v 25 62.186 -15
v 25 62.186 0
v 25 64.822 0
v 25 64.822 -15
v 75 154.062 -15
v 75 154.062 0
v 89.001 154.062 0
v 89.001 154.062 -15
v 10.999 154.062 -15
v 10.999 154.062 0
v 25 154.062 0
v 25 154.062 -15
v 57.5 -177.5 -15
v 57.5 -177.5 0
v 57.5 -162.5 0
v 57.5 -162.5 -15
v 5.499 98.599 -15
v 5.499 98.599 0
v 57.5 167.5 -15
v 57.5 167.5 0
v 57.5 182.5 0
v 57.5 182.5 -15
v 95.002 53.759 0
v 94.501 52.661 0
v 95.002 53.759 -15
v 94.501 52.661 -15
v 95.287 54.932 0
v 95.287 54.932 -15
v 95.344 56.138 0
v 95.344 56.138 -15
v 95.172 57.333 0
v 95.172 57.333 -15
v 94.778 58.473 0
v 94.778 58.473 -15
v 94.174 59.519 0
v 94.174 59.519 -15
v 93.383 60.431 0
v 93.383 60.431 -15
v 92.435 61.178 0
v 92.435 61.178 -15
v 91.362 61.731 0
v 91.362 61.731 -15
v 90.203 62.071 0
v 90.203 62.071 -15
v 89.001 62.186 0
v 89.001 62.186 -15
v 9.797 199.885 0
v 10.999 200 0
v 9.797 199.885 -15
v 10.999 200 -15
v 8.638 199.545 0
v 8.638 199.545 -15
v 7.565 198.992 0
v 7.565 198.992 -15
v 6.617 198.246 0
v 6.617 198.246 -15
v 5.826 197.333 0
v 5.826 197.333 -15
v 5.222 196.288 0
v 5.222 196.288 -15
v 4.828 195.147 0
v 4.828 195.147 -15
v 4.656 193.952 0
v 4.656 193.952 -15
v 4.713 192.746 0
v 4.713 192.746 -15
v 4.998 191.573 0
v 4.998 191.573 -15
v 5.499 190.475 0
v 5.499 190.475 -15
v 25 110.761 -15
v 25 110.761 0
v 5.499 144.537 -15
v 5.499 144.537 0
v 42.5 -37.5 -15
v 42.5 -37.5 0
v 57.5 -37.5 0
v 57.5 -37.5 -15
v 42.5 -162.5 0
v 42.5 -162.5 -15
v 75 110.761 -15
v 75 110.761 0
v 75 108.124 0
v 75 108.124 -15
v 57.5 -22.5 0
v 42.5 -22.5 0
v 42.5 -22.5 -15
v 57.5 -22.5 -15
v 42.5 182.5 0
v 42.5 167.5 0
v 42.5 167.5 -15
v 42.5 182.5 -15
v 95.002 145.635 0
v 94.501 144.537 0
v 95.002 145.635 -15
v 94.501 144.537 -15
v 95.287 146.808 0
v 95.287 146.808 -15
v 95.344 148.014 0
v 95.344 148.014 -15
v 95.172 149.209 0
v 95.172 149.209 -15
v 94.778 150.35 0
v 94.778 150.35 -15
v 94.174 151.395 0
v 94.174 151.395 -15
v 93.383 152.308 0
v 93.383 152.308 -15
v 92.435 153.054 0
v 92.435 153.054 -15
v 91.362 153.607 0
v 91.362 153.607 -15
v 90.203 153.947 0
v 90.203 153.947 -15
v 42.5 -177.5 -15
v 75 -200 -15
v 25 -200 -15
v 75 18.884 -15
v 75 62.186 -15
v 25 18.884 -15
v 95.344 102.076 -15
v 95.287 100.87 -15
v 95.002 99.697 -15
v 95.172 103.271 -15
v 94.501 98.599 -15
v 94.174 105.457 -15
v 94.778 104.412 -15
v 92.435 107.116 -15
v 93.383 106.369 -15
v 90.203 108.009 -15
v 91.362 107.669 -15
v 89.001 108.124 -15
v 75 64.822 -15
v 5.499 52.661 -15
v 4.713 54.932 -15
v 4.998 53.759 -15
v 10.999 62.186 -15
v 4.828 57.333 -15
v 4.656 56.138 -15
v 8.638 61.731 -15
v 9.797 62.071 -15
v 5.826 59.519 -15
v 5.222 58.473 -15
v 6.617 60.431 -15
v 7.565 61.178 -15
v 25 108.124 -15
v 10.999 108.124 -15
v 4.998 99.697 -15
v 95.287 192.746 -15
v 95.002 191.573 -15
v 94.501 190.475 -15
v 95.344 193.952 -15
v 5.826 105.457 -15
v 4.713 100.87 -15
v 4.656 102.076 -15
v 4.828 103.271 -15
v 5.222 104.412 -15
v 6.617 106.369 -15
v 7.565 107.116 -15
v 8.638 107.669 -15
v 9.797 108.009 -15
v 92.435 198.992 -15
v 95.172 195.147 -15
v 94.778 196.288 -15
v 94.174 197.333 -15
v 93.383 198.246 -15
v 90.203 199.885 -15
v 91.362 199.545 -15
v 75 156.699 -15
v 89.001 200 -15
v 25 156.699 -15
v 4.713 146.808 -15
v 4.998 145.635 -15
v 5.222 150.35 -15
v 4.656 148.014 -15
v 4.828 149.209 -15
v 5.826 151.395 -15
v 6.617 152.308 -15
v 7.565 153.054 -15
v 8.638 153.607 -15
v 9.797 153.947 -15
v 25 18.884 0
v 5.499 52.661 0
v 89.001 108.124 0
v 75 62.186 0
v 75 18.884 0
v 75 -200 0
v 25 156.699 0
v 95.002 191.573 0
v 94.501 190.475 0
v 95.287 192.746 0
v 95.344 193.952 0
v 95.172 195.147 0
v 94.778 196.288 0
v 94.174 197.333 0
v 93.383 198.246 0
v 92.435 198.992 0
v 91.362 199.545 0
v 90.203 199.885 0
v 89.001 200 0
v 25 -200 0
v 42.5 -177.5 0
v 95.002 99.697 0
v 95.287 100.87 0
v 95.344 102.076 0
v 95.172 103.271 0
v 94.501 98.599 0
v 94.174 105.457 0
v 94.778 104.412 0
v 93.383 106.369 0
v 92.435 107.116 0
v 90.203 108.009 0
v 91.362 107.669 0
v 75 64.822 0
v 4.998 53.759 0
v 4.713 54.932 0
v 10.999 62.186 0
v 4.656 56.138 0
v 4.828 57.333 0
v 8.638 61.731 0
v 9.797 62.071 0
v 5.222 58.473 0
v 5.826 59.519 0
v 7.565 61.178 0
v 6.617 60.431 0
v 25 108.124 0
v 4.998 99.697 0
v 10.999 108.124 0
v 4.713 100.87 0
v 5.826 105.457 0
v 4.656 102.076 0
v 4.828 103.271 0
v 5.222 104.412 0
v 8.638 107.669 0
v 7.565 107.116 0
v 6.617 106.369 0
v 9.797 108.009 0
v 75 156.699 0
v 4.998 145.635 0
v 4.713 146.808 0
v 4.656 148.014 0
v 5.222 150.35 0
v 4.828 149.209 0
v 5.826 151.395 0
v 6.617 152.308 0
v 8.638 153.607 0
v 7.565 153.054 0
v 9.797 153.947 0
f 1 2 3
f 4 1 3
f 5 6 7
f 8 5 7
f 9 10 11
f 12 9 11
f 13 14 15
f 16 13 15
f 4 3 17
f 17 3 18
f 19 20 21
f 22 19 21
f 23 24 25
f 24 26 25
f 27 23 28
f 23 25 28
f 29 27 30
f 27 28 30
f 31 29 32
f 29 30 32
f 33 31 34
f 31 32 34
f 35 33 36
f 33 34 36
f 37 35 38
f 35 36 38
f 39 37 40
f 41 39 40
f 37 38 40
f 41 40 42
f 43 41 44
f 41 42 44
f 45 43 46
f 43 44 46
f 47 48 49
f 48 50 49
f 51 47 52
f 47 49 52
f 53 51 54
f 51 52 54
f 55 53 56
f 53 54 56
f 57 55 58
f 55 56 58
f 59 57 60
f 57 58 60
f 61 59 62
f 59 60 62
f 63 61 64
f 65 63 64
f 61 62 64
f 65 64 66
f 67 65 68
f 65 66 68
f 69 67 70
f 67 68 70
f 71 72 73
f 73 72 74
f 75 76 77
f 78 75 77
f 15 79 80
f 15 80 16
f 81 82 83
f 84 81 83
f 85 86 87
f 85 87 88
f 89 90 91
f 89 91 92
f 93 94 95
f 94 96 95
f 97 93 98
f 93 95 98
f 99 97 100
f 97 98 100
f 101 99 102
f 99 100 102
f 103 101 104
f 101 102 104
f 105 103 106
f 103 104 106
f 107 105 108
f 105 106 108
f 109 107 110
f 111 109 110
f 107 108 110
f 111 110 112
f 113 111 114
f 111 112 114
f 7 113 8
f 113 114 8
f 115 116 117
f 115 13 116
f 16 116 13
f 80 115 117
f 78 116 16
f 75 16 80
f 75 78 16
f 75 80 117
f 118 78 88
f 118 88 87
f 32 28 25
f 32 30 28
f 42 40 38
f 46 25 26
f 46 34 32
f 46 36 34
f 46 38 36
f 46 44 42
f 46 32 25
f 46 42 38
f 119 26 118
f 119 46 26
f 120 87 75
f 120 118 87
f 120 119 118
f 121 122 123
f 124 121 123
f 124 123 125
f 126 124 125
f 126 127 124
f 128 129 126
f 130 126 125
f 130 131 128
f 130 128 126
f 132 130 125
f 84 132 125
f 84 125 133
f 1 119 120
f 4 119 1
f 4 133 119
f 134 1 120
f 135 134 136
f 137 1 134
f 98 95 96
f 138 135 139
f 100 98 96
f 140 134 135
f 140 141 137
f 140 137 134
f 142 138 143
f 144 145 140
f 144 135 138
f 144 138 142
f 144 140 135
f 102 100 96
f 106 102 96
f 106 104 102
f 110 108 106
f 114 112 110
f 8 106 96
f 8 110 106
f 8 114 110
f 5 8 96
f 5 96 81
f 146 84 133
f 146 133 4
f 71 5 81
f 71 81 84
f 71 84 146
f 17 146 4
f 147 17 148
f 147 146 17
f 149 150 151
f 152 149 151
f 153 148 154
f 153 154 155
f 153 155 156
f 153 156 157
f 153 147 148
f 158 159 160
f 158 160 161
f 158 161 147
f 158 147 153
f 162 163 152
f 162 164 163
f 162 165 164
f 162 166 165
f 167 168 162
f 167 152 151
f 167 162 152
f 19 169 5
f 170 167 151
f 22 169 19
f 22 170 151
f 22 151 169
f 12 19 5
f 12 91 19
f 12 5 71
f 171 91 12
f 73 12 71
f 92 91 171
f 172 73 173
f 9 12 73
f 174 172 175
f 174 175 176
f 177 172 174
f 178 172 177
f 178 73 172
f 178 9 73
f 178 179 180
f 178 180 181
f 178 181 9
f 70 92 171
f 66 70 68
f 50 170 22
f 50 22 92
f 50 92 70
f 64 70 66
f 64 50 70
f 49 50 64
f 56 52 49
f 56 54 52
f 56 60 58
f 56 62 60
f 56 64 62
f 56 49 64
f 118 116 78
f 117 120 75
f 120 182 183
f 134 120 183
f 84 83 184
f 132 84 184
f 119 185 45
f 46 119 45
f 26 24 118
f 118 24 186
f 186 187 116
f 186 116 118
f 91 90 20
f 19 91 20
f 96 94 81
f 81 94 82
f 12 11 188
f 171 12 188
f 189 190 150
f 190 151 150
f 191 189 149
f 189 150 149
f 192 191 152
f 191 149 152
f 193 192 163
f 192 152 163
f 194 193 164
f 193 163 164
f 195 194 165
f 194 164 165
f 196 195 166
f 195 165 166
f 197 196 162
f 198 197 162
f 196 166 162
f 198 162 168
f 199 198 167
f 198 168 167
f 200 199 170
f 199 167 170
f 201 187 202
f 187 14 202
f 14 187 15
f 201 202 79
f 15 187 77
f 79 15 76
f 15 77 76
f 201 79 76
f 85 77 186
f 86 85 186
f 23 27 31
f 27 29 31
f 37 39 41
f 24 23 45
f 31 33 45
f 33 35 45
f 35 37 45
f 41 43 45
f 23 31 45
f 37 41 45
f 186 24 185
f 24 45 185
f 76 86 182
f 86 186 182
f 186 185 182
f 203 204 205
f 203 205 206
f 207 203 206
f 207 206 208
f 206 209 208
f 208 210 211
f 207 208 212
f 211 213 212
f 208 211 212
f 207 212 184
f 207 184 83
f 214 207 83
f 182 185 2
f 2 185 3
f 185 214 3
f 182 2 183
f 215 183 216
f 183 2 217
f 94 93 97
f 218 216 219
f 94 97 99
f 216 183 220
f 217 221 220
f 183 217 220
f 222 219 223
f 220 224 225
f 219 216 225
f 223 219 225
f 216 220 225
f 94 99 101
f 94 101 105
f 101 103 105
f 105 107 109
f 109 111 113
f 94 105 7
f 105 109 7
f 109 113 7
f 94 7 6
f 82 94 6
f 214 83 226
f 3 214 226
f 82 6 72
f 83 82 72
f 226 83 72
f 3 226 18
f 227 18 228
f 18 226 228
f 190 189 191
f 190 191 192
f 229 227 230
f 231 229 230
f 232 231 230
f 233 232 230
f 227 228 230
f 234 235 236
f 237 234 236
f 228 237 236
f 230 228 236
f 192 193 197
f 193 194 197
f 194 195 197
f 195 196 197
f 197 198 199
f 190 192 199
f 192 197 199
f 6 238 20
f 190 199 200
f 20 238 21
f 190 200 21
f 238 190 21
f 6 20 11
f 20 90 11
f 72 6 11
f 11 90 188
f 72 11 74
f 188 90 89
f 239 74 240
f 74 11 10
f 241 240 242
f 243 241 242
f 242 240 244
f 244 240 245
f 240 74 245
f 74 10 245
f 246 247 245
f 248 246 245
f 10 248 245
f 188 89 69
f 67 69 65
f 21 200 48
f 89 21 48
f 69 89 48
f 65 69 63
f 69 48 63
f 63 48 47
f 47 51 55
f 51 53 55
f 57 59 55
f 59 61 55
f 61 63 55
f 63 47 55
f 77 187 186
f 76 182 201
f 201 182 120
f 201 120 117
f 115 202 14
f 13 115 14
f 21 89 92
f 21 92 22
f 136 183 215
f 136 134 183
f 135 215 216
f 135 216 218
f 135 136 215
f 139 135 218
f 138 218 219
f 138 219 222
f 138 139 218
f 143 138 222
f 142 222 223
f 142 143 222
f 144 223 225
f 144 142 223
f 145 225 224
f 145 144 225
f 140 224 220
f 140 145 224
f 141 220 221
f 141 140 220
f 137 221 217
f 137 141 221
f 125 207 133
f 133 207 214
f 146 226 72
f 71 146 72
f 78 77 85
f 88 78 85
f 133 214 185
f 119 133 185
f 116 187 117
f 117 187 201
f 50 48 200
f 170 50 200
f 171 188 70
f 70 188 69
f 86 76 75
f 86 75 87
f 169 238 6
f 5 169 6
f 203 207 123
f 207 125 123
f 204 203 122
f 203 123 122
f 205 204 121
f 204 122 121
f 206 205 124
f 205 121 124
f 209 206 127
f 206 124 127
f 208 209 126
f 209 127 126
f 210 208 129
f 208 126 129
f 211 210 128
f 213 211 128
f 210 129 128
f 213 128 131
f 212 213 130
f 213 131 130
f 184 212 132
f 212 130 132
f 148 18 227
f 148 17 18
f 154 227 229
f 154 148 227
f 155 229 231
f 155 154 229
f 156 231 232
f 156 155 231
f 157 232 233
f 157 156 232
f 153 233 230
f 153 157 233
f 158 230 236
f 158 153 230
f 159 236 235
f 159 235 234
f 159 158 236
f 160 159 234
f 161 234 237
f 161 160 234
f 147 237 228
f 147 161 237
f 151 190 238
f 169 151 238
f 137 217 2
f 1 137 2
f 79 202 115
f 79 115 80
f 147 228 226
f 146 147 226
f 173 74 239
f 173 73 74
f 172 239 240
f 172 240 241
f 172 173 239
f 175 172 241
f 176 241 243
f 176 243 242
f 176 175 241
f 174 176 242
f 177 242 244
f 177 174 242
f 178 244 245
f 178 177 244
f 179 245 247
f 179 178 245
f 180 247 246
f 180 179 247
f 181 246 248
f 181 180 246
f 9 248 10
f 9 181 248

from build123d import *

# Parameters (mm, degrees)
SKETCH2_W           = 15
SKETCH2_H           = 15
BOSS_EXTRUDE1_DEPTH = 15
FILLET1_R           = 6.35


with BuildPart() as part:
    # Sketch2 → Boss-Extrude1 (new body)
    with BuildSketch(Plane.XY):
        Polygon((75, 0), (75, -200), (25, -200), (25, 0), (25, 18.884295249), (0, 62.185565438), (25, 62.185565438), (25, 64.822440103), (0, 108.123710292), (25, 108.123710292), (25, 110.760584957), (0, 154.061855146), (25, 154.061855146), (25, 156.698729811), (0, 200), (100, 200), (75, 156.698729811), (75, 154.061855146), (100, 154.061855146), (75, 110.760584957), (75, 108.123710292), (100, 108.123710292), (75, 64.822440103), (75, 62.185565438), (100, 62.185565438), (75, 18.884295249), align=None)
        with Locations((50, -170)):
            Rectangle(SKETCH2_W, SKETCH2_H, mode=Mode.SUBTRACT)
        with Locations((50, -30)):
            Rectangle(SKETCH2_W, SKETCH2_H, mode=Mode.SUBTRACT)
        with Locations((50, 175)):
            Rectangle(SKETCH2_W, SKETCH2_H, mode=Mode.SUBTRACT)
    extrude(amount=-BOSS_EXTRUDE1_DEPTH)

    # Fillet1
    fillet1_edges = [part.edges().sort_by_distance(p)[0] for p in [
        (0, 62.185565438, -7.5),
        (0, 108.123710292, -7.5),
        (0, 154.061855146, -7.5),
        (0, 200, -7.5),
        (100, 200, -7.5),
        (100, 154.061855146, -7.5),
        (100, 108.123710292, -7.5),
        (100, 62.185565438, -7.5),
    ]]
    fillet(fillet1_edges, radius=FILLET1_R)


solid = part.part
